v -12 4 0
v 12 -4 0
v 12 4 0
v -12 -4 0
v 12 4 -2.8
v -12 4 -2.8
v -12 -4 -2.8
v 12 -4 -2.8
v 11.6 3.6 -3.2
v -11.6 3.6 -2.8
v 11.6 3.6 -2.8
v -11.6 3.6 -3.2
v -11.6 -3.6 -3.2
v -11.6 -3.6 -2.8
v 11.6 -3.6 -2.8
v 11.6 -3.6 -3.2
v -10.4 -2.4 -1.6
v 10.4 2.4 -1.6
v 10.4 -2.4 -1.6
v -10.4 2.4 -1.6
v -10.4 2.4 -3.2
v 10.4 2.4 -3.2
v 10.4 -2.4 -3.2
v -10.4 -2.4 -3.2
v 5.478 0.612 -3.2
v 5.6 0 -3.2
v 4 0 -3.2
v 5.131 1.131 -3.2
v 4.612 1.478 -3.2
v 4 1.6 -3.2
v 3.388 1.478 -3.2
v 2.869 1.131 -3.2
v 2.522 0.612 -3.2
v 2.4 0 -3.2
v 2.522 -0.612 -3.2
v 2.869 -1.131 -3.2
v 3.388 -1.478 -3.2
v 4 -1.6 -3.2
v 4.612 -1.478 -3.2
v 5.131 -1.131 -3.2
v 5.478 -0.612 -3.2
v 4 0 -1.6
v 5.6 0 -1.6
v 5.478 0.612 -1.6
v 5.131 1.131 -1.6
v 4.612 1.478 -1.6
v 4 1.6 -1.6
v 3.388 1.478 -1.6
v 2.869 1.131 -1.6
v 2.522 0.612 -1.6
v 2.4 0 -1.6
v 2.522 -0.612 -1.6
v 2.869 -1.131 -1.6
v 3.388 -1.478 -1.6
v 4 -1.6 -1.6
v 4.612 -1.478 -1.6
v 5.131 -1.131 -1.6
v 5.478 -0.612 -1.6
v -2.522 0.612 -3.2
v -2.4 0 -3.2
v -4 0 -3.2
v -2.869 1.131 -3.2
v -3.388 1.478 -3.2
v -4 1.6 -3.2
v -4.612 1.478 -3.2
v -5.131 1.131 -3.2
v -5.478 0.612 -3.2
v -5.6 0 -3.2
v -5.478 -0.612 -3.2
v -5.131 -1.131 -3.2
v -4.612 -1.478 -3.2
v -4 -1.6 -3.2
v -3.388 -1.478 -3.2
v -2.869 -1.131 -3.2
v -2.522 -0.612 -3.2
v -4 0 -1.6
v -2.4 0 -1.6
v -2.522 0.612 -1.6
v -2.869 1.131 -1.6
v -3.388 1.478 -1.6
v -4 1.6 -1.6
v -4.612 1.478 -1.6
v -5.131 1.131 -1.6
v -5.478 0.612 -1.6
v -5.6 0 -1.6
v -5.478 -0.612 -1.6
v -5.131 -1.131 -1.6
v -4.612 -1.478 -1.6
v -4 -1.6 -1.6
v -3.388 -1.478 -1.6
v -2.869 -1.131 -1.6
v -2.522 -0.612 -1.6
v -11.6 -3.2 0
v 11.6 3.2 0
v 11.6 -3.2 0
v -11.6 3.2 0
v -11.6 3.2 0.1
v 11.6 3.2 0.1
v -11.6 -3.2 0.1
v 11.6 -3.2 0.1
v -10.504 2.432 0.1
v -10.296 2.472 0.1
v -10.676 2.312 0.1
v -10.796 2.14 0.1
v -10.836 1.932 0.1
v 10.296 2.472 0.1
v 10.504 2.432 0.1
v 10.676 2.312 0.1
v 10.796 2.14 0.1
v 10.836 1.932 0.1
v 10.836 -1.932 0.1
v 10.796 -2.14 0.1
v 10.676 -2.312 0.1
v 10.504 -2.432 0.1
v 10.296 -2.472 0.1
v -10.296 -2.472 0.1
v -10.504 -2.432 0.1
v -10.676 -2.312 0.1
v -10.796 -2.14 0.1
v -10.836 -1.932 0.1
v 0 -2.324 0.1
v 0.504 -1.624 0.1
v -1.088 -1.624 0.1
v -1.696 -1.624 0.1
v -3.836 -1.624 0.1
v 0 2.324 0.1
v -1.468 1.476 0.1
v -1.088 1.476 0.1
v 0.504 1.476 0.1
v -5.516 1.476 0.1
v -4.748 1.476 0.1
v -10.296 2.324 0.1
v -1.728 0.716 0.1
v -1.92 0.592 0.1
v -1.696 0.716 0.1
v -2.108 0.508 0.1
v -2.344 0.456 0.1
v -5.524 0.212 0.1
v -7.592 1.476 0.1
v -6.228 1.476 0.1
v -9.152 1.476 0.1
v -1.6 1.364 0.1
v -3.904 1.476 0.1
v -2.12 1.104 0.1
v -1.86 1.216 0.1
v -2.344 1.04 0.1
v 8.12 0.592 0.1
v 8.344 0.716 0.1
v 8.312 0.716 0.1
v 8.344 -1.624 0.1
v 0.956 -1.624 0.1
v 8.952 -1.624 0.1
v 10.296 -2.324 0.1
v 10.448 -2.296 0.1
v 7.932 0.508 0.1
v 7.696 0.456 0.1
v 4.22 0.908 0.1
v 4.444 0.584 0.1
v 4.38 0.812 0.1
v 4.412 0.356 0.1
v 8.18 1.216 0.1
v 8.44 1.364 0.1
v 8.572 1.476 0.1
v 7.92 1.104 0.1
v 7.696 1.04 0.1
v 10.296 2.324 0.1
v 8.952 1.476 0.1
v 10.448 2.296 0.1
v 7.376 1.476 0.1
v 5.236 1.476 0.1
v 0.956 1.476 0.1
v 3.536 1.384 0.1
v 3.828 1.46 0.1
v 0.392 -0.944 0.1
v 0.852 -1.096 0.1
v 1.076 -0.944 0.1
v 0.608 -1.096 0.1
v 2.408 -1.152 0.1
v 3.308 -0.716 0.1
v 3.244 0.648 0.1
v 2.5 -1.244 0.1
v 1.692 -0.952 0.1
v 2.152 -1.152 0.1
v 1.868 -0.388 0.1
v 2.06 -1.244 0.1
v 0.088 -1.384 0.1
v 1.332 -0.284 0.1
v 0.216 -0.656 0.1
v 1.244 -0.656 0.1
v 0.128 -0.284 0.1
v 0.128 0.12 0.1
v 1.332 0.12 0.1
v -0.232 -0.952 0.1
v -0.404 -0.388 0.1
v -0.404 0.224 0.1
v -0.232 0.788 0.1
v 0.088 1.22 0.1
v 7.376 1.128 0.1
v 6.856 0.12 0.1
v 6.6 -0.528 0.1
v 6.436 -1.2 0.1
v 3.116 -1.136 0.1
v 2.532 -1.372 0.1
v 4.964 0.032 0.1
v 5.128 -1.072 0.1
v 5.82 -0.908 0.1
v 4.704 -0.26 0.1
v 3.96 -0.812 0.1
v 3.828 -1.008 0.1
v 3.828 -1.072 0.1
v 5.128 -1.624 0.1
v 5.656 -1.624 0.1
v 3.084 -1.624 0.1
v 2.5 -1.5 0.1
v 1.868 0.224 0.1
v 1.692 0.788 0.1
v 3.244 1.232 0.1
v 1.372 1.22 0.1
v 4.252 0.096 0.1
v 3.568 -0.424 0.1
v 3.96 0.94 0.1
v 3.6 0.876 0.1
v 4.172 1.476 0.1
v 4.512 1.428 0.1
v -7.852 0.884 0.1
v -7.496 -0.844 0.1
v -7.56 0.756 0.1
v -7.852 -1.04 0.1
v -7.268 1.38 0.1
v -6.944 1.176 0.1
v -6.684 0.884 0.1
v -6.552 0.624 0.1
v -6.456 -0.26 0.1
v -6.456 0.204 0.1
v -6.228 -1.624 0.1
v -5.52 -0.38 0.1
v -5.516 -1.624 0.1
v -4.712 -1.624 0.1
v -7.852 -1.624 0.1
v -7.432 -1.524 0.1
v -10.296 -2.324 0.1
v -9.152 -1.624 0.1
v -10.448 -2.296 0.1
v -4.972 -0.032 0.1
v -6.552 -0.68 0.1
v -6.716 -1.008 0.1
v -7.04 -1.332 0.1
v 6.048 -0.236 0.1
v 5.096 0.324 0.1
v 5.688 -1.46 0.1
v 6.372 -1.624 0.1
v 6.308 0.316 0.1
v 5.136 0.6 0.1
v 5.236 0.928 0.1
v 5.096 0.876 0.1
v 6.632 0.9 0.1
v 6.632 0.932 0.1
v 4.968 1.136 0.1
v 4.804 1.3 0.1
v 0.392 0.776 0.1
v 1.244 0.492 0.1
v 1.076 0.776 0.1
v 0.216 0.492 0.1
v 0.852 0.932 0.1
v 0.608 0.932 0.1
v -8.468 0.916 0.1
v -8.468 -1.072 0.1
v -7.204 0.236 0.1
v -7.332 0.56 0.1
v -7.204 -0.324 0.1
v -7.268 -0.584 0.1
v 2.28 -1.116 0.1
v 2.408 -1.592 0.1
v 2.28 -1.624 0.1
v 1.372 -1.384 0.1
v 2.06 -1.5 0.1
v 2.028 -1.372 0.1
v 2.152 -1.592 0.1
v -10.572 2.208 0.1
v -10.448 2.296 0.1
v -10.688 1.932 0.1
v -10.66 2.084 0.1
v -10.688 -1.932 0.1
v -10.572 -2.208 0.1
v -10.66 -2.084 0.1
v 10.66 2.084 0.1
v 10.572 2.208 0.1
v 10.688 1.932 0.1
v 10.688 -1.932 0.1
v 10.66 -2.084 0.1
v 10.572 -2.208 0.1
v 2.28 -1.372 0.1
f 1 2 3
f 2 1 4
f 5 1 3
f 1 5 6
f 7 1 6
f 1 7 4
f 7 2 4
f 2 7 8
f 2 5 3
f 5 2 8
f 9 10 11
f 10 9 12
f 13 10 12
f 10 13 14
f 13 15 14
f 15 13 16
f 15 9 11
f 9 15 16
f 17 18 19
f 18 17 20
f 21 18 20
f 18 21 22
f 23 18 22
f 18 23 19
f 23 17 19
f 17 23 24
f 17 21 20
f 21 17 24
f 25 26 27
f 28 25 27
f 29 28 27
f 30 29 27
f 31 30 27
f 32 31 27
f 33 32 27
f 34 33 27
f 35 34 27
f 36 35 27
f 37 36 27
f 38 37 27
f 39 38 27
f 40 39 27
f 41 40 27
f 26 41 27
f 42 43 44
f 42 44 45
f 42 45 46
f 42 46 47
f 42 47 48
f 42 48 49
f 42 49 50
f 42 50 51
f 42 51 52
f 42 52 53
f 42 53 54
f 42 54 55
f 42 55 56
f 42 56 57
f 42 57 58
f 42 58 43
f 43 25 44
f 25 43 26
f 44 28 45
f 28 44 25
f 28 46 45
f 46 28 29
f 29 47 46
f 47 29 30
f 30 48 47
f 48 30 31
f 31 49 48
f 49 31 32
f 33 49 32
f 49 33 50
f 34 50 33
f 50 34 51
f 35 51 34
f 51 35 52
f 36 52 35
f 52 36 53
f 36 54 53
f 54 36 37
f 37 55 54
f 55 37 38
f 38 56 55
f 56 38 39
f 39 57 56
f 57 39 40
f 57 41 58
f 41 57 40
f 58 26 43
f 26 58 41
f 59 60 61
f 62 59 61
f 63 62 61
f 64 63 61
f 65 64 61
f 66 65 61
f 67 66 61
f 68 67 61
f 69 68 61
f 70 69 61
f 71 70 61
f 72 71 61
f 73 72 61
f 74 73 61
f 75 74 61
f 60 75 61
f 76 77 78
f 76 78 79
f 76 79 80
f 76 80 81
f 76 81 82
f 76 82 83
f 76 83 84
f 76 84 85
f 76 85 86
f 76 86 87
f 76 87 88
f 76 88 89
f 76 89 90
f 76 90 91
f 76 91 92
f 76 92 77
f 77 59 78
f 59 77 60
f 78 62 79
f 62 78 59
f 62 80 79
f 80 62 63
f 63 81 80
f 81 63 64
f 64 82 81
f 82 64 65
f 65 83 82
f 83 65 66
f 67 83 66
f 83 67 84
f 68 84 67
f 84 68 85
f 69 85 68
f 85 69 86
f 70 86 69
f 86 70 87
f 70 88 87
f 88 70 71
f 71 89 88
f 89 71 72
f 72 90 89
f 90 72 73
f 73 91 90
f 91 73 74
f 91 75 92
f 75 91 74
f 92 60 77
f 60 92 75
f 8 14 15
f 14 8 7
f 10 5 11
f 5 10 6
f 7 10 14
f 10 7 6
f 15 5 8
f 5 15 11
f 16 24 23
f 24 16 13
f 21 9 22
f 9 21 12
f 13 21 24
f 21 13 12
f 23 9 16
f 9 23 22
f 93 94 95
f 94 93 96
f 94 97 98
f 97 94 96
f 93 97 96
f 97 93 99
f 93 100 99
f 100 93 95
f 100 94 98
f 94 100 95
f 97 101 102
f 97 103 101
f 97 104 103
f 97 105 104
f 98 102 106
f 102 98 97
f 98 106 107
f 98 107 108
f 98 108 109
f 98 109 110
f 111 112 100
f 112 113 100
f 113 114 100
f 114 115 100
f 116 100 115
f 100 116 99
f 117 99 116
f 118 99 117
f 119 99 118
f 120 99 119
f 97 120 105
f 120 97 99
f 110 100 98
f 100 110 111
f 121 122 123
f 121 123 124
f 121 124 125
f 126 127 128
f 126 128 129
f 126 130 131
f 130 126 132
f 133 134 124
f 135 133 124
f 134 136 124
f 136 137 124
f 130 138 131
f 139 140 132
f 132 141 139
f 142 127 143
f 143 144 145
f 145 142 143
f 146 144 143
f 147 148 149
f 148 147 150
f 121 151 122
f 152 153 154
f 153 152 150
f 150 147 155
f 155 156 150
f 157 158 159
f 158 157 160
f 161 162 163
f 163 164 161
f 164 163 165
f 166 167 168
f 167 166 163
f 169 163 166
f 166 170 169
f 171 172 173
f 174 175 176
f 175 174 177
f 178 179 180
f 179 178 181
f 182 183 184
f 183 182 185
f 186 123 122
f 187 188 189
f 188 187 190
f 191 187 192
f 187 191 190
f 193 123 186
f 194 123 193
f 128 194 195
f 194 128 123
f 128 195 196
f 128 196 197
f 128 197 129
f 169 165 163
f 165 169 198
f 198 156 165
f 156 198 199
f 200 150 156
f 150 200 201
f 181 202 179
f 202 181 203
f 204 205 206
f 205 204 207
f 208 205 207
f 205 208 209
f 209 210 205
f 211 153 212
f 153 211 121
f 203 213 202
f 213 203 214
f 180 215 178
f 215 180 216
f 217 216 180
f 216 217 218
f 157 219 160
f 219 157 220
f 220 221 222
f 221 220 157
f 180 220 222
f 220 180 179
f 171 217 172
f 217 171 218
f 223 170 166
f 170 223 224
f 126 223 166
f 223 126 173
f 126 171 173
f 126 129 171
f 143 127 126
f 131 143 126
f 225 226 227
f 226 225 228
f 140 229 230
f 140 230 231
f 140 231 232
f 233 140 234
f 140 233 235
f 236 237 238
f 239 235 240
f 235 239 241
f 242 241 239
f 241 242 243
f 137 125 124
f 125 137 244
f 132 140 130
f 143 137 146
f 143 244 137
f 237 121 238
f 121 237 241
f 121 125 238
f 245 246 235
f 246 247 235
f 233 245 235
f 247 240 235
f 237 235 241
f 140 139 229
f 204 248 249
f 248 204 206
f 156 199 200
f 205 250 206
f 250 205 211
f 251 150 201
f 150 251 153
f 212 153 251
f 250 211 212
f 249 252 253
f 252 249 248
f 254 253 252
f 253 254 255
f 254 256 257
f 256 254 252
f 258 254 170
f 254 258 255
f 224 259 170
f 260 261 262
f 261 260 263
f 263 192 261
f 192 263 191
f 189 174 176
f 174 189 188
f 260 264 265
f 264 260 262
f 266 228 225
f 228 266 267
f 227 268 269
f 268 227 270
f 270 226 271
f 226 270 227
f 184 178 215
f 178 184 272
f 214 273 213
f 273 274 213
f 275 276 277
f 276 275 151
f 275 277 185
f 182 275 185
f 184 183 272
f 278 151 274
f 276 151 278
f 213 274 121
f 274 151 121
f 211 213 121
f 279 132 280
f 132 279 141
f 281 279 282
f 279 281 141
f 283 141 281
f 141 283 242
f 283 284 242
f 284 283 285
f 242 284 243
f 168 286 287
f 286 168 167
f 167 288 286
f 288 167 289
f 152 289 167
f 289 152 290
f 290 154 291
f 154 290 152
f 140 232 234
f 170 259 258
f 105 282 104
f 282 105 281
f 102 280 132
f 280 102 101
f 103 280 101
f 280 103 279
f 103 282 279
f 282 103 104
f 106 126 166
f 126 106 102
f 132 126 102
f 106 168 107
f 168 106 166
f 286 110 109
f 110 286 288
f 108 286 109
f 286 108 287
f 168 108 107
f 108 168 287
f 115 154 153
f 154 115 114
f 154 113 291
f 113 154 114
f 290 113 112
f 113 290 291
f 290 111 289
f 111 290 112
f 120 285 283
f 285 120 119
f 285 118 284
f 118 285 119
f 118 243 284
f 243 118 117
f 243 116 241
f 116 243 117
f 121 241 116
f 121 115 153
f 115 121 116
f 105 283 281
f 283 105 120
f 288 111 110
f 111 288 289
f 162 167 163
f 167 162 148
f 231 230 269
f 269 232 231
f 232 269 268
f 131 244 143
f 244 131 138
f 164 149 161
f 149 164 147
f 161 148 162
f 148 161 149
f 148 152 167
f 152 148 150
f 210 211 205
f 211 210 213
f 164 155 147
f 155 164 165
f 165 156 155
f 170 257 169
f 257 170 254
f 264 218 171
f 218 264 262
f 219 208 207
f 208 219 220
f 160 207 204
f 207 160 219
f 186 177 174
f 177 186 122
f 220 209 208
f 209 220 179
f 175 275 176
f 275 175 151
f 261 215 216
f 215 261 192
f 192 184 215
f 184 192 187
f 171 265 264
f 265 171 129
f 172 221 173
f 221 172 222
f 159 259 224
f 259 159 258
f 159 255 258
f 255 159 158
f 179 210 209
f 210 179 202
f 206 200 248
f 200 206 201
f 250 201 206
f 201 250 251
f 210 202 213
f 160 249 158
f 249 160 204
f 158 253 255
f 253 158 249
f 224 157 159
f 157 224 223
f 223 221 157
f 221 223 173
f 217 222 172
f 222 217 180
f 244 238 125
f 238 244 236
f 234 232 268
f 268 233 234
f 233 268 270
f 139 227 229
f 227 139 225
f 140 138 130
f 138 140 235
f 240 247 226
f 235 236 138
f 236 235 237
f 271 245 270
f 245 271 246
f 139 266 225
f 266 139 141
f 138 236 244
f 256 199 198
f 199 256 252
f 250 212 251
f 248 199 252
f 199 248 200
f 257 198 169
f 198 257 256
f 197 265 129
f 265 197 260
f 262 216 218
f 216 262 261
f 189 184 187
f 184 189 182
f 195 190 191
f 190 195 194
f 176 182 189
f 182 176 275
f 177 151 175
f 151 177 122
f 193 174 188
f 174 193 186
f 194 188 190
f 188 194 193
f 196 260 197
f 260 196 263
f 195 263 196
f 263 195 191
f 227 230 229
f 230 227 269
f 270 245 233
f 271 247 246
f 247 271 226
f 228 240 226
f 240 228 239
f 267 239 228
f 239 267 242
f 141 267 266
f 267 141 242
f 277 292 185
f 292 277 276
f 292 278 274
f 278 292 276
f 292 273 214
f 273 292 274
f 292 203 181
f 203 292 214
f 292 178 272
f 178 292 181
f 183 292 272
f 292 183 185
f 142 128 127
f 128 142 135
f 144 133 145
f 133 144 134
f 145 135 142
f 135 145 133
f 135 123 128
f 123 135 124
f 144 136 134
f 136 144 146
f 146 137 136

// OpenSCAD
use <../lib.scad>
use <6296256j.scad>
use <63864.scad>
function ldraw_lib__63864d0g() = [
// 0 Tile  1 x  3 with White "DK 10.271" on Black Background Sticker
// 0 Name: 63864d0g.dat
// 0 Author: Evert-Jan Boer [ejboer]
// 0 !LDRAW_ORG Shortcut UPDATE 2026-07
// 0 !LICENSE Licensed under CC BY 4.0 : see CAreadme.txt
// 
// 0 BFC CERTIFY CCW
  [0,"BFC","CERTIFY"],
  [0,"BFC","CCW"],
// 
// 0 !CATEGORY Sticker Shortcut
// 0 !KEYWORDS Bricklink 63864pb159, Fiat 500, set 10271
// 
// 0 !HISTORY 2026-07-30 [OrionP] Official Update 2026-07
// 
// 1 16 0 0 0 1 0 0 0 1 0 0 0 1 63864.dat
  [1,16,0,0,0,1,0,0,0,1,0,0,0,1, ldraw_lib__63864()],
// 1 16 0 0 0 1 0 0 0 1 0 0 0 1 6296256j.dat
  [1,16,0,0,0,1,0,0,0,1,0,0,0,1, ldraw_lib__6296256j()],
];
module ldraw_lib__63864d0g(step=0, col=false, unit=2/5, alt=false, line=0.2, solid=!$preview)
    makepoly(ldraw_lib__63864d0g(), step=step, col=col, unit=unit, alt=alt, line=line, solid=solid);
ldraw_lib__63864d0g(line=0.2);
